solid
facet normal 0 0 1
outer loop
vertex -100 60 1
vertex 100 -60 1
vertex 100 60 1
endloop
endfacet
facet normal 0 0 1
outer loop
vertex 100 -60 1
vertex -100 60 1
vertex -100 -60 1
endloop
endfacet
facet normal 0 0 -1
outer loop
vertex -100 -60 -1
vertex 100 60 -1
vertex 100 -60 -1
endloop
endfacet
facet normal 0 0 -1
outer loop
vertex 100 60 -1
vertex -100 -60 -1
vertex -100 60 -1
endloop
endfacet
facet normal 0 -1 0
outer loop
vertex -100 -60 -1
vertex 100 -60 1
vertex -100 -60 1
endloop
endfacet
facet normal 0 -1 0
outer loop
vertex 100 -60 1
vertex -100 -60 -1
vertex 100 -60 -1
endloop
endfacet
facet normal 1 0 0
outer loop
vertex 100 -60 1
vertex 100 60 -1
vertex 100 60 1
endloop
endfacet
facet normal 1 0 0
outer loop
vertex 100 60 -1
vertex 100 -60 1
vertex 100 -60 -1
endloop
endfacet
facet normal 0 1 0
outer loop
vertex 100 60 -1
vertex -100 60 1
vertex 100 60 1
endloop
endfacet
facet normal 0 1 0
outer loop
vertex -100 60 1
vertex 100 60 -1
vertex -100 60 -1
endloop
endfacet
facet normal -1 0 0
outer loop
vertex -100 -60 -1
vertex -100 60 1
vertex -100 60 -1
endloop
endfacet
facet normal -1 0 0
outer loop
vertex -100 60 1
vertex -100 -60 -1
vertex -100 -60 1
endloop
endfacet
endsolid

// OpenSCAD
$fn = 64;

// Sheet mild steel (modeled as a thin solid plate)
length = 200;   // mm
width  = 120;   // mm
thick  = 2;     // mm

color([0.55, 0.55, 0.58])
cube([length, width, thick], center=true);
